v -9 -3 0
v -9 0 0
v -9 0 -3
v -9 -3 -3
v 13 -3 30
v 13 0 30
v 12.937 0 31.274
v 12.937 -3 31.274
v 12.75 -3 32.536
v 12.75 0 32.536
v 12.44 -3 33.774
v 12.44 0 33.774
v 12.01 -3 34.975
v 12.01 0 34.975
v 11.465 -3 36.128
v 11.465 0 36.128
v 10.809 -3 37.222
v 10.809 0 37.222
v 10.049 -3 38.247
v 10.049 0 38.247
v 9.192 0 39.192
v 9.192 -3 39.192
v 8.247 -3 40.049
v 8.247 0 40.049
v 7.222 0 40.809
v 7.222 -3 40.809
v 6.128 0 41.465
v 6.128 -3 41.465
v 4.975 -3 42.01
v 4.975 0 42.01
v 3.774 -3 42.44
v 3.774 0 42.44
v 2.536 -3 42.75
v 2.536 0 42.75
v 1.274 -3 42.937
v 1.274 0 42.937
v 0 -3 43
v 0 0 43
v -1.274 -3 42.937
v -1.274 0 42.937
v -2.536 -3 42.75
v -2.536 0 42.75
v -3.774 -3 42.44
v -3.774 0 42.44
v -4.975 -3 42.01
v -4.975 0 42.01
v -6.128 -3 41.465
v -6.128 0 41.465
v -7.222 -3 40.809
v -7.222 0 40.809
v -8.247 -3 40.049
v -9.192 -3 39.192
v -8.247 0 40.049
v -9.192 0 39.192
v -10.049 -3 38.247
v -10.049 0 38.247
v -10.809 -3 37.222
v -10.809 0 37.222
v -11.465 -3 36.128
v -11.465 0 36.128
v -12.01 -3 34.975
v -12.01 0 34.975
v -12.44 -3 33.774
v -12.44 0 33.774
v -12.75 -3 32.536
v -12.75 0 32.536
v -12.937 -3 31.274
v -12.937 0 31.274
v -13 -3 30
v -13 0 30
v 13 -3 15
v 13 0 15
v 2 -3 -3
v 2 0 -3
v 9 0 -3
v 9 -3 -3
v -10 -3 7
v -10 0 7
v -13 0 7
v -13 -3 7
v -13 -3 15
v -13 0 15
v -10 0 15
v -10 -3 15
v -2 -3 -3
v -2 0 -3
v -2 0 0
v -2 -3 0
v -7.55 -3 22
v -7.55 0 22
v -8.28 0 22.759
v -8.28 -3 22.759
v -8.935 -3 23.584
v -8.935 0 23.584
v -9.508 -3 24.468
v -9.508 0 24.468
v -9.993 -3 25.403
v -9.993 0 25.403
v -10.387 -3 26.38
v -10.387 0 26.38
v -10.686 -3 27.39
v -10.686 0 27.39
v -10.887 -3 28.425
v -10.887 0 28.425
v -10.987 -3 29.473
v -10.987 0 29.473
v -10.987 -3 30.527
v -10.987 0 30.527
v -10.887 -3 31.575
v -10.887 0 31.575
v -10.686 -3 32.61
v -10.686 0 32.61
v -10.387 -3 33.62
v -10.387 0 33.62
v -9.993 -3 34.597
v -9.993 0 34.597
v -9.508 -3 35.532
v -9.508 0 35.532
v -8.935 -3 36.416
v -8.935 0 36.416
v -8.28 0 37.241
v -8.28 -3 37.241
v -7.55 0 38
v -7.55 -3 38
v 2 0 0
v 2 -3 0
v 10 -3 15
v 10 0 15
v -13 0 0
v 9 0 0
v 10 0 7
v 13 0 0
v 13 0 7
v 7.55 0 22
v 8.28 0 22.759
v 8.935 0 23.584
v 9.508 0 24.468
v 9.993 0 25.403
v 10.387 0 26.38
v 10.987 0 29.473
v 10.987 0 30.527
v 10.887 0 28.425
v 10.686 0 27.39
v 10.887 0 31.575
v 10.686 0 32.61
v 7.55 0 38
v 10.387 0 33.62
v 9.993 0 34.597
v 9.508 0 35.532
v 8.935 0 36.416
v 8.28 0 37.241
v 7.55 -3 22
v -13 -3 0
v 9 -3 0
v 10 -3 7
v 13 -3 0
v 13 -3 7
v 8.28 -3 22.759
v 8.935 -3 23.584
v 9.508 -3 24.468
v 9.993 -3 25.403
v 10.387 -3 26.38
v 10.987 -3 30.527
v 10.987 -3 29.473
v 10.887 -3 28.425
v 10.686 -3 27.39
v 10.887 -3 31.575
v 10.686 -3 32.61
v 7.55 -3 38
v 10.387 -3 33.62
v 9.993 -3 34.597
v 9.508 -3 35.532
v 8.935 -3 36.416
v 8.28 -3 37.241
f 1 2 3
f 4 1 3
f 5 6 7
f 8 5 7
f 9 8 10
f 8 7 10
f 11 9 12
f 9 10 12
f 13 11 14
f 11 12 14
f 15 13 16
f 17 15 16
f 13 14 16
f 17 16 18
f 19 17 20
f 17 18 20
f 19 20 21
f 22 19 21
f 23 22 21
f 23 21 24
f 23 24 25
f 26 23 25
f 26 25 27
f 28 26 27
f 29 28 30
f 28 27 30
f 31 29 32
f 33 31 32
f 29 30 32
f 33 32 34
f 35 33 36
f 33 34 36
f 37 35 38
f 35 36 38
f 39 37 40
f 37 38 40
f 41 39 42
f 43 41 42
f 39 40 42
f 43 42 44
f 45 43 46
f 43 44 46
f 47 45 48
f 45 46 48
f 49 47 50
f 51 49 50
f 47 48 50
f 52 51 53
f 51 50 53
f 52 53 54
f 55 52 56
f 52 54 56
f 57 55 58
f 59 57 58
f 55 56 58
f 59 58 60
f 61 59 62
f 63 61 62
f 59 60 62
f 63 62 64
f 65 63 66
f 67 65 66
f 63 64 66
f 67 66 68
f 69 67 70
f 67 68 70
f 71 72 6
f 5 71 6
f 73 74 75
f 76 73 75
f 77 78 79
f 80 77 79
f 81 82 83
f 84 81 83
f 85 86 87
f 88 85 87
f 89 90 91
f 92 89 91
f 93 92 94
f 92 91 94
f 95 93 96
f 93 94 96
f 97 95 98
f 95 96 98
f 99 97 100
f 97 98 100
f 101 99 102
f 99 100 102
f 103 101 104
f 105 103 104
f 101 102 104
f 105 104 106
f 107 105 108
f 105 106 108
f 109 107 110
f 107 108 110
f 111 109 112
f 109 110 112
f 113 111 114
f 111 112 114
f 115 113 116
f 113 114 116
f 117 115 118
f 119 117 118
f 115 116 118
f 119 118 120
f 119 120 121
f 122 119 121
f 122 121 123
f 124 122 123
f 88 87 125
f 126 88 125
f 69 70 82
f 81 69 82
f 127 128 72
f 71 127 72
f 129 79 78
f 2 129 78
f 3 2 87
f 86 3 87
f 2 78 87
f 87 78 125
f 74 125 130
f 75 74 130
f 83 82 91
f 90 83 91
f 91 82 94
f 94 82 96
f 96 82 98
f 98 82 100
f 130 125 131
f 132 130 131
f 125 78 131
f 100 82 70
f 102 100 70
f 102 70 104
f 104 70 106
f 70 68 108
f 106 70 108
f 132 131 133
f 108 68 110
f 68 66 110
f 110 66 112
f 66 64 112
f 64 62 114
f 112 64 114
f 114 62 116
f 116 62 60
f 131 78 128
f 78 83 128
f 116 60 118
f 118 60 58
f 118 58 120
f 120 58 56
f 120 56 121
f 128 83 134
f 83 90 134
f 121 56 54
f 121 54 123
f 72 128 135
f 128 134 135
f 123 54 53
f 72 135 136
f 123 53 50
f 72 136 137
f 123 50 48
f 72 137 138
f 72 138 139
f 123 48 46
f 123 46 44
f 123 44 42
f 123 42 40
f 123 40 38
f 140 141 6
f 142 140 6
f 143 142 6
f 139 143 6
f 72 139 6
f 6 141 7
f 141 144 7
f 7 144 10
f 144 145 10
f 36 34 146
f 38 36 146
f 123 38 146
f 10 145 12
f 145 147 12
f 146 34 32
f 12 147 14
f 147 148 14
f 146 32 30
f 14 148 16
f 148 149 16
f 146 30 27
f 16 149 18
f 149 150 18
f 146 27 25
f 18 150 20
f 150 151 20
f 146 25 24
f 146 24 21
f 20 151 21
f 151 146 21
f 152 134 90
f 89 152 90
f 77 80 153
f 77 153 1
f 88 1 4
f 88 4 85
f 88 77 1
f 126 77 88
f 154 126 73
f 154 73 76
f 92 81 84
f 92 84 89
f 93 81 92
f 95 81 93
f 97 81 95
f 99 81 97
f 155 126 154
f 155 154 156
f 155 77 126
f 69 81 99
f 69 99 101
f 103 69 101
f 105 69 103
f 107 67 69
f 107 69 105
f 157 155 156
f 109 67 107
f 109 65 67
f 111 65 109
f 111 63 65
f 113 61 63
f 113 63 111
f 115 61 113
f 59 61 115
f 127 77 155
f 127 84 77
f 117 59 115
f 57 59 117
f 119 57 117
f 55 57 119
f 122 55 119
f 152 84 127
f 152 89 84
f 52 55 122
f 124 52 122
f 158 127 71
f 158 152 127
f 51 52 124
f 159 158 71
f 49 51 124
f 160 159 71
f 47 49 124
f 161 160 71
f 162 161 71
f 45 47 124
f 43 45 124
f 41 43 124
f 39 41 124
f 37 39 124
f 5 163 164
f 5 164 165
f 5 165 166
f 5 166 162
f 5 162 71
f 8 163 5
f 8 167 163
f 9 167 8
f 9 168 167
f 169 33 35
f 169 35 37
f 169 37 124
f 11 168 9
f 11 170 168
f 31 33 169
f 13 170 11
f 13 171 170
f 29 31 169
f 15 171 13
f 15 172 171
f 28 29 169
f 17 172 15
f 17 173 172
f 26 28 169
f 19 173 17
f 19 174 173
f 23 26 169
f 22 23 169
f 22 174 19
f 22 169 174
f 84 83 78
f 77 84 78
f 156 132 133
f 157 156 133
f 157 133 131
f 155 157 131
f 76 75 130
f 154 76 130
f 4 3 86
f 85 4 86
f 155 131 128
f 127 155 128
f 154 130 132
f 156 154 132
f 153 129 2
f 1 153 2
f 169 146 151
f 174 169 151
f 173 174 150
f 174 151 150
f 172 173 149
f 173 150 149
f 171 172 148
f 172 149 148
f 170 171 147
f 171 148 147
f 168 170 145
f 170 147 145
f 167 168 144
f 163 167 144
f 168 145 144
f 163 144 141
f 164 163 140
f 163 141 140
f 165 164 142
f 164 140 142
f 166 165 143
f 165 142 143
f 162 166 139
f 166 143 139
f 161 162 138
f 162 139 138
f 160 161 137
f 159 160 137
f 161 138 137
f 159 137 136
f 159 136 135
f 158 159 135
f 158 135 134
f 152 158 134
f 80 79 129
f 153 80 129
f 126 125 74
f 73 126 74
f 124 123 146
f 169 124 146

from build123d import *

# Parameters (mm, degrees)
F1_DEPTH = 3


with BuildPart() as f1:
    # F0 (on Front) → F1 (new body)
    with BuildSketch(Plane.XZ):
        with BuildLine():
            Line((13, 15), (13, 30))
            ThreePointArc((13, 30), (0, 43), (-13, 30))
            Line((-13, 30), (-13, 15))
            Line((-13, 15), (-10, 15))
            Line((-10, 15), (-10, 7))
            Line((-10, 7), (-13, 7))
            Line((-13, 7), (-13, 0))
            Line((-13, 0), (-9, 0))
            Line((-9, 0), (-9, -3))
            Line((-9, -3), (-2, -3))
            Line((-2, -3), (-2, 0))
            Line((-2, 0), (0, 0))
            Line((0, 0), (2, 0))
            Line((2, 0), (2, -3))
            Line((2, -3), (9, -3))
            Line((9, -3), (9, 0))
            Line((9, 0), (13, 0))
            Line((13, 0), (13, 7))
            Line((13, 7), (10, 7))
            Line((10, 7), (10, 15))
            Line((10, 15), (13, 15))
        make_face()
        with BuildLine():
            ThreePointArc((-7.549834, 22), (-11, 30), (-7.549834, 38))
            Line((-7.549834, 38), (7.549834, 38))
            ThreePointArc((7.549834, 38), (11, 30), (7.549834, 22))
            Line((7.549834, 22), (-7.549834, 22))
        make_face(mode=Mode.SUBTRACT)
    extrude(amount=F1_DEPTH)


solid = f1.part
